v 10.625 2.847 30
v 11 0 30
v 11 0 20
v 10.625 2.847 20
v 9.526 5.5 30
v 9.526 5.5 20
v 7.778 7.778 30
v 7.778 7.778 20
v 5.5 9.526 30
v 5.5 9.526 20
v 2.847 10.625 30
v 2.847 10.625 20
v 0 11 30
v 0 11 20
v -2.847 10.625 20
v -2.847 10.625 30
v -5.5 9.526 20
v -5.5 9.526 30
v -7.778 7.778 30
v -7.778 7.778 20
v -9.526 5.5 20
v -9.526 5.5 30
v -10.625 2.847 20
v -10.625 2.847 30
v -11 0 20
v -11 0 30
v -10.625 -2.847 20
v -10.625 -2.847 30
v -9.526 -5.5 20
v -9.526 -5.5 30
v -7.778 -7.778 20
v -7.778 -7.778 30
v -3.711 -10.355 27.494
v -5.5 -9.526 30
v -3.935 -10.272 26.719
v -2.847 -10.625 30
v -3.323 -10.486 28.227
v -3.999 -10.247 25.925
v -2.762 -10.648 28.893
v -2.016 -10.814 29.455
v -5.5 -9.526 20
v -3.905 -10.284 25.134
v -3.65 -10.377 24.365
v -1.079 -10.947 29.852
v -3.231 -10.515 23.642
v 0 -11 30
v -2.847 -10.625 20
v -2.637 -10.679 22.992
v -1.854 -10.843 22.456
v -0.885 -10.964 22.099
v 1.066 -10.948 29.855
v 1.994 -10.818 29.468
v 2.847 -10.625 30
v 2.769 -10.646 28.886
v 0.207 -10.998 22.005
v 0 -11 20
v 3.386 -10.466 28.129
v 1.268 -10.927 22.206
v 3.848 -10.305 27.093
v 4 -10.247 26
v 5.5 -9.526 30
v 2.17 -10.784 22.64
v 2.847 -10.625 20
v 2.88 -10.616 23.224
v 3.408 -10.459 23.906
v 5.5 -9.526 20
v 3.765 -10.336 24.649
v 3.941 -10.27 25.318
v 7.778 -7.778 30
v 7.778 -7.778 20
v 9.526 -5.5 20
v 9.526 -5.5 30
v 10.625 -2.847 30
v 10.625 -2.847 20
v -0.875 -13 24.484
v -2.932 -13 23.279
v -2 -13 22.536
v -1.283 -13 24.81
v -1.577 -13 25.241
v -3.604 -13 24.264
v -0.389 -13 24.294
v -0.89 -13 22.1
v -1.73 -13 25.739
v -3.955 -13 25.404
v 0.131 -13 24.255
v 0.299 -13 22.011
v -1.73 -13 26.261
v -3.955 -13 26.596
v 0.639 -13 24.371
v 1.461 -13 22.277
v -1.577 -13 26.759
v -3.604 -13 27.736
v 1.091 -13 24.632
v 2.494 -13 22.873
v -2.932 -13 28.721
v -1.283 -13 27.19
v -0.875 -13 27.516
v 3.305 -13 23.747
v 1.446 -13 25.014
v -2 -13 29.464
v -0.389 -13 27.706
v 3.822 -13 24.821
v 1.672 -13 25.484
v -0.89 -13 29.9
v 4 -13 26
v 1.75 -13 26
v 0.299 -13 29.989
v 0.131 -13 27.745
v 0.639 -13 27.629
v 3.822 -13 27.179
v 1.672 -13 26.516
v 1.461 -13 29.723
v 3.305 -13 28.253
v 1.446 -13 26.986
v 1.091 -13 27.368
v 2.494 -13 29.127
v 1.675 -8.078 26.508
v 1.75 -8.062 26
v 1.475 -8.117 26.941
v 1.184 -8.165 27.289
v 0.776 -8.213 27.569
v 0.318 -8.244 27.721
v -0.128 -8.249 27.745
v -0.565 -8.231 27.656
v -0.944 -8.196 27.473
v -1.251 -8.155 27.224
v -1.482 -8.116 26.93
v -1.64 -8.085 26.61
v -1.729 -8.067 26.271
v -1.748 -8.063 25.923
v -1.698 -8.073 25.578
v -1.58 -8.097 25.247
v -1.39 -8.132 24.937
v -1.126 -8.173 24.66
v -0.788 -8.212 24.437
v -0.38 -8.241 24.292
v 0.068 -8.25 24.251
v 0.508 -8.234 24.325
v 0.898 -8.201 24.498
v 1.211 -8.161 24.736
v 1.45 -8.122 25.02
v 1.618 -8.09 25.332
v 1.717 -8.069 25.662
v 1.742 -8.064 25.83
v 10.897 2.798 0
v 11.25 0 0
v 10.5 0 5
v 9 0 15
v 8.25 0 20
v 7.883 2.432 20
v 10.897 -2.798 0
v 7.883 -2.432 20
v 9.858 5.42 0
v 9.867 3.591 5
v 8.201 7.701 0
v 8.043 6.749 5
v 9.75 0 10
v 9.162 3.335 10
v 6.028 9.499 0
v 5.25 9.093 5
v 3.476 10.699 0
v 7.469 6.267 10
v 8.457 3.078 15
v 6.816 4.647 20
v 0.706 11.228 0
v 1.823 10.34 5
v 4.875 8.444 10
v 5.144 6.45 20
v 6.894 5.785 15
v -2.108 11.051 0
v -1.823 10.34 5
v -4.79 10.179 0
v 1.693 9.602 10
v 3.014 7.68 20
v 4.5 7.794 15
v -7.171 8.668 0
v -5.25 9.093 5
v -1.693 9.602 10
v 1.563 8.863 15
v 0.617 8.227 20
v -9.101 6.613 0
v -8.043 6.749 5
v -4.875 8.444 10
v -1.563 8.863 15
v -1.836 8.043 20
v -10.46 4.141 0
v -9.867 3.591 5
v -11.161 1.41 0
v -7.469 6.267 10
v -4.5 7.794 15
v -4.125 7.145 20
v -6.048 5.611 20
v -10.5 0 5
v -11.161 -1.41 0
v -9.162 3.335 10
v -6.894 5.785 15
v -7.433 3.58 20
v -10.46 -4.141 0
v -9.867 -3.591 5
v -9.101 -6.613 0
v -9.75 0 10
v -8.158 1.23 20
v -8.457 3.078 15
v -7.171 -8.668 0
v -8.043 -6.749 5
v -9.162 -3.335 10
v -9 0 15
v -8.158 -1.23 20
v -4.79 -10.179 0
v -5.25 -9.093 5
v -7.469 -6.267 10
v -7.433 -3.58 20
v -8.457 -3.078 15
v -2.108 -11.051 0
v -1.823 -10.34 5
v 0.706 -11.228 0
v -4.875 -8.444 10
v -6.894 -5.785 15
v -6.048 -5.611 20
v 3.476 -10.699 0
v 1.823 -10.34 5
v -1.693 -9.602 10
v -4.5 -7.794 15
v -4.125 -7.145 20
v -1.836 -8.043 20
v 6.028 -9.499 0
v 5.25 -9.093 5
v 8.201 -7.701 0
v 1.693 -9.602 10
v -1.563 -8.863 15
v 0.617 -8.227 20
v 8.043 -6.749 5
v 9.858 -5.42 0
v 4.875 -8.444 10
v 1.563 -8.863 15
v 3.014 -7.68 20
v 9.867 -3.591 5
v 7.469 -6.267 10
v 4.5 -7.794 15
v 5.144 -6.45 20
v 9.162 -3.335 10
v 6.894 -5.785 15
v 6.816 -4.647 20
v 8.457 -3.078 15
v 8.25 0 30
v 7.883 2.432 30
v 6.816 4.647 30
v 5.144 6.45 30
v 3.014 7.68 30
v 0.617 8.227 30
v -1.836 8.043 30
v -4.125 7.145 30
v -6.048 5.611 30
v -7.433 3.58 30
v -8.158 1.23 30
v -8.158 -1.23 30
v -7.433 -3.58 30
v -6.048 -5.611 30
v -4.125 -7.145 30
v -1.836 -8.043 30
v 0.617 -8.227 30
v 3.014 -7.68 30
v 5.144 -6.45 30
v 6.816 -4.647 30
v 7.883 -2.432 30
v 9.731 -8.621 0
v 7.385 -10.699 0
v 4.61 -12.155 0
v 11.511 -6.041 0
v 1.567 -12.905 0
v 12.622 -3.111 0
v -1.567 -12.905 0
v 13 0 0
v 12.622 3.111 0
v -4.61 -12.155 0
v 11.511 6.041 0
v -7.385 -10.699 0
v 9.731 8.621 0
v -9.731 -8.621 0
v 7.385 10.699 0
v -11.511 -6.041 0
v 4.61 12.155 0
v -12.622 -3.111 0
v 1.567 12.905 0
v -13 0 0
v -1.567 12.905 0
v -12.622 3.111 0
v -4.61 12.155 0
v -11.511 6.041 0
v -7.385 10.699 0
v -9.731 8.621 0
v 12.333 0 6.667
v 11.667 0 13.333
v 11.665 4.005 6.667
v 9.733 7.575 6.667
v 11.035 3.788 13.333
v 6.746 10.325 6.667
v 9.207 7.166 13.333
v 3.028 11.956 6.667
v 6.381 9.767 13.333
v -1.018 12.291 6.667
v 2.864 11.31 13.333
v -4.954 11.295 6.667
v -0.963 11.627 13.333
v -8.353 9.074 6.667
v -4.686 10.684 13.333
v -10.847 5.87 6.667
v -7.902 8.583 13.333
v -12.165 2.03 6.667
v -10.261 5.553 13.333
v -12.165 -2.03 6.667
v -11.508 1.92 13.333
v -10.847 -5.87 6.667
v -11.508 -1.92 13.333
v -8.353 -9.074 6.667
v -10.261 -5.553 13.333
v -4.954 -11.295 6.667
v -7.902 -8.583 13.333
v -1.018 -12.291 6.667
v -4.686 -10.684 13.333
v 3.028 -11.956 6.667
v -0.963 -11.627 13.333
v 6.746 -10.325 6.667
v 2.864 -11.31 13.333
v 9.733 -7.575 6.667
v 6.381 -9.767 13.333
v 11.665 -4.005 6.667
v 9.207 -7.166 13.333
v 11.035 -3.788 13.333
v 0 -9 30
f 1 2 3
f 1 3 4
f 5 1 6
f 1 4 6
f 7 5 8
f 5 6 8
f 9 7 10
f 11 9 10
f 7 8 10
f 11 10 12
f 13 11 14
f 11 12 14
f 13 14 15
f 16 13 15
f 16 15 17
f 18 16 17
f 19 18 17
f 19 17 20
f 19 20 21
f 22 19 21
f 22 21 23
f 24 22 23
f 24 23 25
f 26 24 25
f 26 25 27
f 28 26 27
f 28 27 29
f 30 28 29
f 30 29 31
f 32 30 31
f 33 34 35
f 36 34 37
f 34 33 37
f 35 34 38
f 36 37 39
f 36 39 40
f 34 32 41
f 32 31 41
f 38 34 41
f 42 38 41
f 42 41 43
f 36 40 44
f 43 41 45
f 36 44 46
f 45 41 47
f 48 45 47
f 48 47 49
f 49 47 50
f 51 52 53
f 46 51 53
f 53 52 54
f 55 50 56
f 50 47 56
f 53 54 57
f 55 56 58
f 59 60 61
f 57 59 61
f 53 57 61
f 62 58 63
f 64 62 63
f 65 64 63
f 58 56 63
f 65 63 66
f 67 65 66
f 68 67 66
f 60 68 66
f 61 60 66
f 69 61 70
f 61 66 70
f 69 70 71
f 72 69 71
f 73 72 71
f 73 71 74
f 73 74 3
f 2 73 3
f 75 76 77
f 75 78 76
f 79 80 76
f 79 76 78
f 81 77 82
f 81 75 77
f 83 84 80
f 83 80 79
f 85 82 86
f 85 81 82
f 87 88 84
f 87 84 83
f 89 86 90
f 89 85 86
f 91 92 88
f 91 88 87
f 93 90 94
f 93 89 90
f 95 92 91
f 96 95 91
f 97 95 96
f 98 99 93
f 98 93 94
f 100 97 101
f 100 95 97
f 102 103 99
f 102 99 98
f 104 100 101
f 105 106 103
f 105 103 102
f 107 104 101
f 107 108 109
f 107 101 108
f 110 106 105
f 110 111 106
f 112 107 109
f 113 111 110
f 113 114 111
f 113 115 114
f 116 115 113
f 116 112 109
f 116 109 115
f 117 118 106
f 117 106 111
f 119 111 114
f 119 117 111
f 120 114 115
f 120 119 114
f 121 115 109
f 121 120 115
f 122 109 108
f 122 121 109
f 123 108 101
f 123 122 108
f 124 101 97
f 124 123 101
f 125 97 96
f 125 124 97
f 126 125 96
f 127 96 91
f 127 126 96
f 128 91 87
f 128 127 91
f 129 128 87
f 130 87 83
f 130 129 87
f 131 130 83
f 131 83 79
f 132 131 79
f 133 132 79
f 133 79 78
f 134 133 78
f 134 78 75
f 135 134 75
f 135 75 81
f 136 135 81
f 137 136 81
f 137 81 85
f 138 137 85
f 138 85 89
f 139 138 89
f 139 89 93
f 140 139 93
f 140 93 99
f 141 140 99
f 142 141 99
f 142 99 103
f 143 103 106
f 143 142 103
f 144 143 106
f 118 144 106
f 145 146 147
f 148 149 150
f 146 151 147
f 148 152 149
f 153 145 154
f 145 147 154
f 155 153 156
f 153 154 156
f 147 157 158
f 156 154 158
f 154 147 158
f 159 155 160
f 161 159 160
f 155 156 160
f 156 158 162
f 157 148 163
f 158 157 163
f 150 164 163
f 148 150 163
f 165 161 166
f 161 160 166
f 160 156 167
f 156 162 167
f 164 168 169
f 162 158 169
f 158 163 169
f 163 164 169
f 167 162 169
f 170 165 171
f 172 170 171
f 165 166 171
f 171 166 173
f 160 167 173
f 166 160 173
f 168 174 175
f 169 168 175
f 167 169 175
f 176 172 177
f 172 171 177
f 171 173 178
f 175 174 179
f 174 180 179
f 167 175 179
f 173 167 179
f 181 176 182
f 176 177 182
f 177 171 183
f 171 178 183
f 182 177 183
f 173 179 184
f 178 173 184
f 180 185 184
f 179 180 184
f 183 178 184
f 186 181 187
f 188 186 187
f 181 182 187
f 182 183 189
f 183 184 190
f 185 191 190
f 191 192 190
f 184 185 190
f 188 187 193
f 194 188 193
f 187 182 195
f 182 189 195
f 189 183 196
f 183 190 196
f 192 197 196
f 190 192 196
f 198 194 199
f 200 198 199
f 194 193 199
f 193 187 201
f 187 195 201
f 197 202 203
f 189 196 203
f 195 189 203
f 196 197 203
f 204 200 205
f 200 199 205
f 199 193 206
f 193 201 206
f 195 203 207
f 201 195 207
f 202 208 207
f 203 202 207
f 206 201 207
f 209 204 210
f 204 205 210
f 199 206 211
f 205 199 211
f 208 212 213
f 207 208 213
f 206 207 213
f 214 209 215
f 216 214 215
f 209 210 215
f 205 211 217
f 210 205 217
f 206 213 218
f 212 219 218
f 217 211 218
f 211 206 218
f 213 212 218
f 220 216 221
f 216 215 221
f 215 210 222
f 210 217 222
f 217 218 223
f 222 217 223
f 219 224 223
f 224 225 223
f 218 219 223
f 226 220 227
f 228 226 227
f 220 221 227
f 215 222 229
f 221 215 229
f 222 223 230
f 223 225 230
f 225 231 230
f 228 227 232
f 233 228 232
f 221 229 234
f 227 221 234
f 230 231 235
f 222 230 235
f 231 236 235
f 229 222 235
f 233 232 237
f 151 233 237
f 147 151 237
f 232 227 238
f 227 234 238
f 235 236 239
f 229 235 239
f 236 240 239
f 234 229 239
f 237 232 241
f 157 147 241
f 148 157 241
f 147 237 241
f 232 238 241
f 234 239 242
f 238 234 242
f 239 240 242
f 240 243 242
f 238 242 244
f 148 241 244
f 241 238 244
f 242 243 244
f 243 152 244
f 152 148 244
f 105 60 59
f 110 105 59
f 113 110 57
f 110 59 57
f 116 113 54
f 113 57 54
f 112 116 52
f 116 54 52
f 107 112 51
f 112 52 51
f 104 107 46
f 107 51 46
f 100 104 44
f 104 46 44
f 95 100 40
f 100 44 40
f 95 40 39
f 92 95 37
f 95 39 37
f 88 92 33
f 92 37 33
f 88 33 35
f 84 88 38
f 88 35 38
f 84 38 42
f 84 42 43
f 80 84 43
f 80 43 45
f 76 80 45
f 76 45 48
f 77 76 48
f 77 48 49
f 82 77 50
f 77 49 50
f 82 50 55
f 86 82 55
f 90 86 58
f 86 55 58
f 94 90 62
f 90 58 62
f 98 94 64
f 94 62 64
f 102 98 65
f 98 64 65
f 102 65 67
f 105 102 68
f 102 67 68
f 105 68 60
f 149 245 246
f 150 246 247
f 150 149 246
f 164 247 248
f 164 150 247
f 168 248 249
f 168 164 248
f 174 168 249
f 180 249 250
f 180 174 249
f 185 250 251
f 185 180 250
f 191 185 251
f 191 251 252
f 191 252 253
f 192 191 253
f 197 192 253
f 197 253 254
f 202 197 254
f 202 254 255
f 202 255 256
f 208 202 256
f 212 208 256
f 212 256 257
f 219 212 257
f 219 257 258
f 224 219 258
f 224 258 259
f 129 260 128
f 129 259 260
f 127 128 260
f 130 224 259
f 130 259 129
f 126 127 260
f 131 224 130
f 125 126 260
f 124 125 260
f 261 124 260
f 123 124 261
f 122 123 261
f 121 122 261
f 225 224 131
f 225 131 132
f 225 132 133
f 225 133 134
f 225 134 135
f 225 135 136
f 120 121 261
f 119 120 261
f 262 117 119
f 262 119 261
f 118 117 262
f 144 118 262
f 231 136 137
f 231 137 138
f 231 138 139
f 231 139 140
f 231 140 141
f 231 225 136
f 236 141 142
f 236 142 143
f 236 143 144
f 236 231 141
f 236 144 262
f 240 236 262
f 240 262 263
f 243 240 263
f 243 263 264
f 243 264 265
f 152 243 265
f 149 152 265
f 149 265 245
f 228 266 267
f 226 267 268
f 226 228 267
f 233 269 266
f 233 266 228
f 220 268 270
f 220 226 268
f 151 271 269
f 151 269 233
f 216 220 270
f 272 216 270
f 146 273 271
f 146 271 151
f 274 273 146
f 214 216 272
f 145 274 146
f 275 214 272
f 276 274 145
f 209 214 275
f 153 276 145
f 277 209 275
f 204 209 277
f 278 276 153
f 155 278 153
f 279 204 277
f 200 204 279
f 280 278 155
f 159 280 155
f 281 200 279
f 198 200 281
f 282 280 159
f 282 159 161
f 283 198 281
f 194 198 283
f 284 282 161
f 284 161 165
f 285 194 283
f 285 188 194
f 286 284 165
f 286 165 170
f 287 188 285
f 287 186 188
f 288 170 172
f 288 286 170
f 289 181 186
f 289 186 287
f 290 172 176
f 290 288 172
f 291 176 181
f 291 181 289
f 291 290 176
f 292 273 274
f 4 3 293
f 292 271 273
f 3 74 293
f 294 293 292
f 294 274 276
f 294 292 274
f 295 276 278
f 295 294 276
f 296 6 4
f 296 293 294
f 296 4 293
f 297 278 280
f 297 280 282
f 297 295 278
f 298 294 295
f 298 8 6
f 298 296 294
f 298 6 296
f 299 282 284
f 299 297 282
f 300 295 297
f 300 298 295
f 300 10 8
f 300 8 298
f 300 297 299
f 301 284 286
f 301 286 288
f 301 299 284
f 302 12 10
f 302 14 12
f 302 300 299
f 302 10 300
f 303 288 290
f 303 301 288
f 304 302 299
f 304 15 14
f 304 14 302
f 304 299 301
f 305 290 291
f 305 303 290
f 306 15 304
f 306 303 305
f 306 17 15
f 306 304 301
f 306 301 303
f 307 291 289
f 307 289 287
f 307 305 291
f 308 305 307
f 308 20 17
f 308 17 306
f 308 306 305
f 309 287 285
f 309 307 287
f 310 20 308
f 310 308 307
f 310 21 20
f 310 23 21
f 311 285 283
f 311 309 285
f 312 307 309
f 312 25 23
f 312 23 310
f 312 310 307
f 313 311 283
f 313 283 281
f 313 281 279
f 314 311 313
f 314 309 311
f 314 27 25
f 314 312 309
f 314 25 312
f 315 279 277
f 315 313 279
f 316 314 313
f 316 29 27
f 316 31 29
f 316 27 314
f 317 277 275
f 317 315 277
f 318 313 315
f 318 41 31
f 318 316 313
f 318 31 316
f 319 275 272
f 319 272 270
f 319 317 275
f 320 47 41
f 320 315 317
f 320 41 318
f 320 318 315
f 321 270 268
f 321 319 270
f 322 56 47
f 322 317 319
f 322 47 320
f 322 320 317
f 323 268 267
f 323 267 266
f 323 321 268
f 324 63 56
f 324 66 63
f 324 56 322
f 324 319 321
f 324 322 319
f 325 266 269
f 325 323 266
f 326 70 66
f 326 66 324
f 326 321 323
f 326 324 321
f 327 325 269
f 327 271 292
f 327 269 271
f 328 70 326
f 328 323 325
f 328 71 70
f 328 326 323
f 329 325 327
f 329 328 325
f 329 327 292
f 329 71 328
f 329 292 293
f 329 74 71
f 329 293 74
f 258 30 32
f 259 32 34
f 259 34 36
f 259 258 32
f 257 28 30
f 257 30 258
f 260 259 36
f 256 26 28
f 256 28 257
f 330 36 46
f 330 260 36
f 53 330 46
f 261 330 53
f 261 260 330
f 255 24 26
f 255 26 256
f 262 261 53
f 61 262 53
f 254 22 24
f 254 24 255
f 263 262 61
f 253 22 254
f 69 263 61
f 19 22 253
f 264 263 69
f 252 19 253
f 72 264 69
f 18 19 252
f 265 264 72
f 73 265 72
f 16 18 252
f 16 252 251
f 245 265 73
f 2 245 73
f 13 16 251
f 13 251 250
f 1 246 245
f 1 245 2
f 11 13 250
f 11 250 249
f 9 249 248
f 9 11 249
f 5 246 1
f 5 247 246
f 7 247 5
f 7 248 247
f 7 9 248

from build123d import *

# Parameters (mm, degrees)
CYLINDER035_R     = 11
CYLINDER035_DEPTH = 10
CYLINDER036_R     = 8.25
CYLINDER036_DEPTH = 10
CYLINDER058_R     = 4
CYLINDER058_DEPTH = 4
CYLINDER059_R     = 1.75
CYLINDER059_DEPTH = 6


with BuildPart() as part:
    # Cone001 → Cone001 (revolve)
    with BuildSketch(Plane.XZ):
        Polygon((0, 0), (13, 0), (11, 20), (0, 20), align=None)
    revolve(axis=Axis((0, 0, 0), (0, 0, 1)))

    # Cone002 → Cone002 (revolve, cut)
    with BuildSketch(Plane.XZ):
        Polygon((0, 0), (11.25, 0), (8.25, 20), (0, 20), align=None)
    revolve(axis=Axis((0, 0, 0), (0, 0, 1)), mode=Mode.SUBTRACT)

    # Cylinder035 → Cylinder035 (join)
    with BuildSketch(Plane.XY.offset(20)):
        Circle(CYLINDER035_R)
    extrude(amount=CYLINDER035_DEPTH)

    # Cylinder036 → Cylinder036 (cut)
    with BuildSketch(Plane.XY.offset(20)):
        Circle(CYLINDER036_R)
    extrude(amount=CYLINDER036_DEPTH, mode=Mode.SUBTRACT)

    # Cylinder058 → Cylinder058 (join)
    with BuildSketch(Plane(origin=(0, -9, 26), x_dir=(1, 0, 0), z_dir=(0, -1, 0))):
        Circle(CYLINDER058_R)
    extrude(amount=CYLINDER058_DEPTH)

    # Cylinder059 → Cylinder059 (cut)
    with BuildSketch(Plane(origin=(0, -7, 26), x_dir=(1, 0, 0), z_dir=(0, -1, 0))):
        Circle(CYLINDER059_R)
    extrude(amount=CYLINDER059_DEPTH, mode=Mode.SUBTRACT)


solid = part.part
